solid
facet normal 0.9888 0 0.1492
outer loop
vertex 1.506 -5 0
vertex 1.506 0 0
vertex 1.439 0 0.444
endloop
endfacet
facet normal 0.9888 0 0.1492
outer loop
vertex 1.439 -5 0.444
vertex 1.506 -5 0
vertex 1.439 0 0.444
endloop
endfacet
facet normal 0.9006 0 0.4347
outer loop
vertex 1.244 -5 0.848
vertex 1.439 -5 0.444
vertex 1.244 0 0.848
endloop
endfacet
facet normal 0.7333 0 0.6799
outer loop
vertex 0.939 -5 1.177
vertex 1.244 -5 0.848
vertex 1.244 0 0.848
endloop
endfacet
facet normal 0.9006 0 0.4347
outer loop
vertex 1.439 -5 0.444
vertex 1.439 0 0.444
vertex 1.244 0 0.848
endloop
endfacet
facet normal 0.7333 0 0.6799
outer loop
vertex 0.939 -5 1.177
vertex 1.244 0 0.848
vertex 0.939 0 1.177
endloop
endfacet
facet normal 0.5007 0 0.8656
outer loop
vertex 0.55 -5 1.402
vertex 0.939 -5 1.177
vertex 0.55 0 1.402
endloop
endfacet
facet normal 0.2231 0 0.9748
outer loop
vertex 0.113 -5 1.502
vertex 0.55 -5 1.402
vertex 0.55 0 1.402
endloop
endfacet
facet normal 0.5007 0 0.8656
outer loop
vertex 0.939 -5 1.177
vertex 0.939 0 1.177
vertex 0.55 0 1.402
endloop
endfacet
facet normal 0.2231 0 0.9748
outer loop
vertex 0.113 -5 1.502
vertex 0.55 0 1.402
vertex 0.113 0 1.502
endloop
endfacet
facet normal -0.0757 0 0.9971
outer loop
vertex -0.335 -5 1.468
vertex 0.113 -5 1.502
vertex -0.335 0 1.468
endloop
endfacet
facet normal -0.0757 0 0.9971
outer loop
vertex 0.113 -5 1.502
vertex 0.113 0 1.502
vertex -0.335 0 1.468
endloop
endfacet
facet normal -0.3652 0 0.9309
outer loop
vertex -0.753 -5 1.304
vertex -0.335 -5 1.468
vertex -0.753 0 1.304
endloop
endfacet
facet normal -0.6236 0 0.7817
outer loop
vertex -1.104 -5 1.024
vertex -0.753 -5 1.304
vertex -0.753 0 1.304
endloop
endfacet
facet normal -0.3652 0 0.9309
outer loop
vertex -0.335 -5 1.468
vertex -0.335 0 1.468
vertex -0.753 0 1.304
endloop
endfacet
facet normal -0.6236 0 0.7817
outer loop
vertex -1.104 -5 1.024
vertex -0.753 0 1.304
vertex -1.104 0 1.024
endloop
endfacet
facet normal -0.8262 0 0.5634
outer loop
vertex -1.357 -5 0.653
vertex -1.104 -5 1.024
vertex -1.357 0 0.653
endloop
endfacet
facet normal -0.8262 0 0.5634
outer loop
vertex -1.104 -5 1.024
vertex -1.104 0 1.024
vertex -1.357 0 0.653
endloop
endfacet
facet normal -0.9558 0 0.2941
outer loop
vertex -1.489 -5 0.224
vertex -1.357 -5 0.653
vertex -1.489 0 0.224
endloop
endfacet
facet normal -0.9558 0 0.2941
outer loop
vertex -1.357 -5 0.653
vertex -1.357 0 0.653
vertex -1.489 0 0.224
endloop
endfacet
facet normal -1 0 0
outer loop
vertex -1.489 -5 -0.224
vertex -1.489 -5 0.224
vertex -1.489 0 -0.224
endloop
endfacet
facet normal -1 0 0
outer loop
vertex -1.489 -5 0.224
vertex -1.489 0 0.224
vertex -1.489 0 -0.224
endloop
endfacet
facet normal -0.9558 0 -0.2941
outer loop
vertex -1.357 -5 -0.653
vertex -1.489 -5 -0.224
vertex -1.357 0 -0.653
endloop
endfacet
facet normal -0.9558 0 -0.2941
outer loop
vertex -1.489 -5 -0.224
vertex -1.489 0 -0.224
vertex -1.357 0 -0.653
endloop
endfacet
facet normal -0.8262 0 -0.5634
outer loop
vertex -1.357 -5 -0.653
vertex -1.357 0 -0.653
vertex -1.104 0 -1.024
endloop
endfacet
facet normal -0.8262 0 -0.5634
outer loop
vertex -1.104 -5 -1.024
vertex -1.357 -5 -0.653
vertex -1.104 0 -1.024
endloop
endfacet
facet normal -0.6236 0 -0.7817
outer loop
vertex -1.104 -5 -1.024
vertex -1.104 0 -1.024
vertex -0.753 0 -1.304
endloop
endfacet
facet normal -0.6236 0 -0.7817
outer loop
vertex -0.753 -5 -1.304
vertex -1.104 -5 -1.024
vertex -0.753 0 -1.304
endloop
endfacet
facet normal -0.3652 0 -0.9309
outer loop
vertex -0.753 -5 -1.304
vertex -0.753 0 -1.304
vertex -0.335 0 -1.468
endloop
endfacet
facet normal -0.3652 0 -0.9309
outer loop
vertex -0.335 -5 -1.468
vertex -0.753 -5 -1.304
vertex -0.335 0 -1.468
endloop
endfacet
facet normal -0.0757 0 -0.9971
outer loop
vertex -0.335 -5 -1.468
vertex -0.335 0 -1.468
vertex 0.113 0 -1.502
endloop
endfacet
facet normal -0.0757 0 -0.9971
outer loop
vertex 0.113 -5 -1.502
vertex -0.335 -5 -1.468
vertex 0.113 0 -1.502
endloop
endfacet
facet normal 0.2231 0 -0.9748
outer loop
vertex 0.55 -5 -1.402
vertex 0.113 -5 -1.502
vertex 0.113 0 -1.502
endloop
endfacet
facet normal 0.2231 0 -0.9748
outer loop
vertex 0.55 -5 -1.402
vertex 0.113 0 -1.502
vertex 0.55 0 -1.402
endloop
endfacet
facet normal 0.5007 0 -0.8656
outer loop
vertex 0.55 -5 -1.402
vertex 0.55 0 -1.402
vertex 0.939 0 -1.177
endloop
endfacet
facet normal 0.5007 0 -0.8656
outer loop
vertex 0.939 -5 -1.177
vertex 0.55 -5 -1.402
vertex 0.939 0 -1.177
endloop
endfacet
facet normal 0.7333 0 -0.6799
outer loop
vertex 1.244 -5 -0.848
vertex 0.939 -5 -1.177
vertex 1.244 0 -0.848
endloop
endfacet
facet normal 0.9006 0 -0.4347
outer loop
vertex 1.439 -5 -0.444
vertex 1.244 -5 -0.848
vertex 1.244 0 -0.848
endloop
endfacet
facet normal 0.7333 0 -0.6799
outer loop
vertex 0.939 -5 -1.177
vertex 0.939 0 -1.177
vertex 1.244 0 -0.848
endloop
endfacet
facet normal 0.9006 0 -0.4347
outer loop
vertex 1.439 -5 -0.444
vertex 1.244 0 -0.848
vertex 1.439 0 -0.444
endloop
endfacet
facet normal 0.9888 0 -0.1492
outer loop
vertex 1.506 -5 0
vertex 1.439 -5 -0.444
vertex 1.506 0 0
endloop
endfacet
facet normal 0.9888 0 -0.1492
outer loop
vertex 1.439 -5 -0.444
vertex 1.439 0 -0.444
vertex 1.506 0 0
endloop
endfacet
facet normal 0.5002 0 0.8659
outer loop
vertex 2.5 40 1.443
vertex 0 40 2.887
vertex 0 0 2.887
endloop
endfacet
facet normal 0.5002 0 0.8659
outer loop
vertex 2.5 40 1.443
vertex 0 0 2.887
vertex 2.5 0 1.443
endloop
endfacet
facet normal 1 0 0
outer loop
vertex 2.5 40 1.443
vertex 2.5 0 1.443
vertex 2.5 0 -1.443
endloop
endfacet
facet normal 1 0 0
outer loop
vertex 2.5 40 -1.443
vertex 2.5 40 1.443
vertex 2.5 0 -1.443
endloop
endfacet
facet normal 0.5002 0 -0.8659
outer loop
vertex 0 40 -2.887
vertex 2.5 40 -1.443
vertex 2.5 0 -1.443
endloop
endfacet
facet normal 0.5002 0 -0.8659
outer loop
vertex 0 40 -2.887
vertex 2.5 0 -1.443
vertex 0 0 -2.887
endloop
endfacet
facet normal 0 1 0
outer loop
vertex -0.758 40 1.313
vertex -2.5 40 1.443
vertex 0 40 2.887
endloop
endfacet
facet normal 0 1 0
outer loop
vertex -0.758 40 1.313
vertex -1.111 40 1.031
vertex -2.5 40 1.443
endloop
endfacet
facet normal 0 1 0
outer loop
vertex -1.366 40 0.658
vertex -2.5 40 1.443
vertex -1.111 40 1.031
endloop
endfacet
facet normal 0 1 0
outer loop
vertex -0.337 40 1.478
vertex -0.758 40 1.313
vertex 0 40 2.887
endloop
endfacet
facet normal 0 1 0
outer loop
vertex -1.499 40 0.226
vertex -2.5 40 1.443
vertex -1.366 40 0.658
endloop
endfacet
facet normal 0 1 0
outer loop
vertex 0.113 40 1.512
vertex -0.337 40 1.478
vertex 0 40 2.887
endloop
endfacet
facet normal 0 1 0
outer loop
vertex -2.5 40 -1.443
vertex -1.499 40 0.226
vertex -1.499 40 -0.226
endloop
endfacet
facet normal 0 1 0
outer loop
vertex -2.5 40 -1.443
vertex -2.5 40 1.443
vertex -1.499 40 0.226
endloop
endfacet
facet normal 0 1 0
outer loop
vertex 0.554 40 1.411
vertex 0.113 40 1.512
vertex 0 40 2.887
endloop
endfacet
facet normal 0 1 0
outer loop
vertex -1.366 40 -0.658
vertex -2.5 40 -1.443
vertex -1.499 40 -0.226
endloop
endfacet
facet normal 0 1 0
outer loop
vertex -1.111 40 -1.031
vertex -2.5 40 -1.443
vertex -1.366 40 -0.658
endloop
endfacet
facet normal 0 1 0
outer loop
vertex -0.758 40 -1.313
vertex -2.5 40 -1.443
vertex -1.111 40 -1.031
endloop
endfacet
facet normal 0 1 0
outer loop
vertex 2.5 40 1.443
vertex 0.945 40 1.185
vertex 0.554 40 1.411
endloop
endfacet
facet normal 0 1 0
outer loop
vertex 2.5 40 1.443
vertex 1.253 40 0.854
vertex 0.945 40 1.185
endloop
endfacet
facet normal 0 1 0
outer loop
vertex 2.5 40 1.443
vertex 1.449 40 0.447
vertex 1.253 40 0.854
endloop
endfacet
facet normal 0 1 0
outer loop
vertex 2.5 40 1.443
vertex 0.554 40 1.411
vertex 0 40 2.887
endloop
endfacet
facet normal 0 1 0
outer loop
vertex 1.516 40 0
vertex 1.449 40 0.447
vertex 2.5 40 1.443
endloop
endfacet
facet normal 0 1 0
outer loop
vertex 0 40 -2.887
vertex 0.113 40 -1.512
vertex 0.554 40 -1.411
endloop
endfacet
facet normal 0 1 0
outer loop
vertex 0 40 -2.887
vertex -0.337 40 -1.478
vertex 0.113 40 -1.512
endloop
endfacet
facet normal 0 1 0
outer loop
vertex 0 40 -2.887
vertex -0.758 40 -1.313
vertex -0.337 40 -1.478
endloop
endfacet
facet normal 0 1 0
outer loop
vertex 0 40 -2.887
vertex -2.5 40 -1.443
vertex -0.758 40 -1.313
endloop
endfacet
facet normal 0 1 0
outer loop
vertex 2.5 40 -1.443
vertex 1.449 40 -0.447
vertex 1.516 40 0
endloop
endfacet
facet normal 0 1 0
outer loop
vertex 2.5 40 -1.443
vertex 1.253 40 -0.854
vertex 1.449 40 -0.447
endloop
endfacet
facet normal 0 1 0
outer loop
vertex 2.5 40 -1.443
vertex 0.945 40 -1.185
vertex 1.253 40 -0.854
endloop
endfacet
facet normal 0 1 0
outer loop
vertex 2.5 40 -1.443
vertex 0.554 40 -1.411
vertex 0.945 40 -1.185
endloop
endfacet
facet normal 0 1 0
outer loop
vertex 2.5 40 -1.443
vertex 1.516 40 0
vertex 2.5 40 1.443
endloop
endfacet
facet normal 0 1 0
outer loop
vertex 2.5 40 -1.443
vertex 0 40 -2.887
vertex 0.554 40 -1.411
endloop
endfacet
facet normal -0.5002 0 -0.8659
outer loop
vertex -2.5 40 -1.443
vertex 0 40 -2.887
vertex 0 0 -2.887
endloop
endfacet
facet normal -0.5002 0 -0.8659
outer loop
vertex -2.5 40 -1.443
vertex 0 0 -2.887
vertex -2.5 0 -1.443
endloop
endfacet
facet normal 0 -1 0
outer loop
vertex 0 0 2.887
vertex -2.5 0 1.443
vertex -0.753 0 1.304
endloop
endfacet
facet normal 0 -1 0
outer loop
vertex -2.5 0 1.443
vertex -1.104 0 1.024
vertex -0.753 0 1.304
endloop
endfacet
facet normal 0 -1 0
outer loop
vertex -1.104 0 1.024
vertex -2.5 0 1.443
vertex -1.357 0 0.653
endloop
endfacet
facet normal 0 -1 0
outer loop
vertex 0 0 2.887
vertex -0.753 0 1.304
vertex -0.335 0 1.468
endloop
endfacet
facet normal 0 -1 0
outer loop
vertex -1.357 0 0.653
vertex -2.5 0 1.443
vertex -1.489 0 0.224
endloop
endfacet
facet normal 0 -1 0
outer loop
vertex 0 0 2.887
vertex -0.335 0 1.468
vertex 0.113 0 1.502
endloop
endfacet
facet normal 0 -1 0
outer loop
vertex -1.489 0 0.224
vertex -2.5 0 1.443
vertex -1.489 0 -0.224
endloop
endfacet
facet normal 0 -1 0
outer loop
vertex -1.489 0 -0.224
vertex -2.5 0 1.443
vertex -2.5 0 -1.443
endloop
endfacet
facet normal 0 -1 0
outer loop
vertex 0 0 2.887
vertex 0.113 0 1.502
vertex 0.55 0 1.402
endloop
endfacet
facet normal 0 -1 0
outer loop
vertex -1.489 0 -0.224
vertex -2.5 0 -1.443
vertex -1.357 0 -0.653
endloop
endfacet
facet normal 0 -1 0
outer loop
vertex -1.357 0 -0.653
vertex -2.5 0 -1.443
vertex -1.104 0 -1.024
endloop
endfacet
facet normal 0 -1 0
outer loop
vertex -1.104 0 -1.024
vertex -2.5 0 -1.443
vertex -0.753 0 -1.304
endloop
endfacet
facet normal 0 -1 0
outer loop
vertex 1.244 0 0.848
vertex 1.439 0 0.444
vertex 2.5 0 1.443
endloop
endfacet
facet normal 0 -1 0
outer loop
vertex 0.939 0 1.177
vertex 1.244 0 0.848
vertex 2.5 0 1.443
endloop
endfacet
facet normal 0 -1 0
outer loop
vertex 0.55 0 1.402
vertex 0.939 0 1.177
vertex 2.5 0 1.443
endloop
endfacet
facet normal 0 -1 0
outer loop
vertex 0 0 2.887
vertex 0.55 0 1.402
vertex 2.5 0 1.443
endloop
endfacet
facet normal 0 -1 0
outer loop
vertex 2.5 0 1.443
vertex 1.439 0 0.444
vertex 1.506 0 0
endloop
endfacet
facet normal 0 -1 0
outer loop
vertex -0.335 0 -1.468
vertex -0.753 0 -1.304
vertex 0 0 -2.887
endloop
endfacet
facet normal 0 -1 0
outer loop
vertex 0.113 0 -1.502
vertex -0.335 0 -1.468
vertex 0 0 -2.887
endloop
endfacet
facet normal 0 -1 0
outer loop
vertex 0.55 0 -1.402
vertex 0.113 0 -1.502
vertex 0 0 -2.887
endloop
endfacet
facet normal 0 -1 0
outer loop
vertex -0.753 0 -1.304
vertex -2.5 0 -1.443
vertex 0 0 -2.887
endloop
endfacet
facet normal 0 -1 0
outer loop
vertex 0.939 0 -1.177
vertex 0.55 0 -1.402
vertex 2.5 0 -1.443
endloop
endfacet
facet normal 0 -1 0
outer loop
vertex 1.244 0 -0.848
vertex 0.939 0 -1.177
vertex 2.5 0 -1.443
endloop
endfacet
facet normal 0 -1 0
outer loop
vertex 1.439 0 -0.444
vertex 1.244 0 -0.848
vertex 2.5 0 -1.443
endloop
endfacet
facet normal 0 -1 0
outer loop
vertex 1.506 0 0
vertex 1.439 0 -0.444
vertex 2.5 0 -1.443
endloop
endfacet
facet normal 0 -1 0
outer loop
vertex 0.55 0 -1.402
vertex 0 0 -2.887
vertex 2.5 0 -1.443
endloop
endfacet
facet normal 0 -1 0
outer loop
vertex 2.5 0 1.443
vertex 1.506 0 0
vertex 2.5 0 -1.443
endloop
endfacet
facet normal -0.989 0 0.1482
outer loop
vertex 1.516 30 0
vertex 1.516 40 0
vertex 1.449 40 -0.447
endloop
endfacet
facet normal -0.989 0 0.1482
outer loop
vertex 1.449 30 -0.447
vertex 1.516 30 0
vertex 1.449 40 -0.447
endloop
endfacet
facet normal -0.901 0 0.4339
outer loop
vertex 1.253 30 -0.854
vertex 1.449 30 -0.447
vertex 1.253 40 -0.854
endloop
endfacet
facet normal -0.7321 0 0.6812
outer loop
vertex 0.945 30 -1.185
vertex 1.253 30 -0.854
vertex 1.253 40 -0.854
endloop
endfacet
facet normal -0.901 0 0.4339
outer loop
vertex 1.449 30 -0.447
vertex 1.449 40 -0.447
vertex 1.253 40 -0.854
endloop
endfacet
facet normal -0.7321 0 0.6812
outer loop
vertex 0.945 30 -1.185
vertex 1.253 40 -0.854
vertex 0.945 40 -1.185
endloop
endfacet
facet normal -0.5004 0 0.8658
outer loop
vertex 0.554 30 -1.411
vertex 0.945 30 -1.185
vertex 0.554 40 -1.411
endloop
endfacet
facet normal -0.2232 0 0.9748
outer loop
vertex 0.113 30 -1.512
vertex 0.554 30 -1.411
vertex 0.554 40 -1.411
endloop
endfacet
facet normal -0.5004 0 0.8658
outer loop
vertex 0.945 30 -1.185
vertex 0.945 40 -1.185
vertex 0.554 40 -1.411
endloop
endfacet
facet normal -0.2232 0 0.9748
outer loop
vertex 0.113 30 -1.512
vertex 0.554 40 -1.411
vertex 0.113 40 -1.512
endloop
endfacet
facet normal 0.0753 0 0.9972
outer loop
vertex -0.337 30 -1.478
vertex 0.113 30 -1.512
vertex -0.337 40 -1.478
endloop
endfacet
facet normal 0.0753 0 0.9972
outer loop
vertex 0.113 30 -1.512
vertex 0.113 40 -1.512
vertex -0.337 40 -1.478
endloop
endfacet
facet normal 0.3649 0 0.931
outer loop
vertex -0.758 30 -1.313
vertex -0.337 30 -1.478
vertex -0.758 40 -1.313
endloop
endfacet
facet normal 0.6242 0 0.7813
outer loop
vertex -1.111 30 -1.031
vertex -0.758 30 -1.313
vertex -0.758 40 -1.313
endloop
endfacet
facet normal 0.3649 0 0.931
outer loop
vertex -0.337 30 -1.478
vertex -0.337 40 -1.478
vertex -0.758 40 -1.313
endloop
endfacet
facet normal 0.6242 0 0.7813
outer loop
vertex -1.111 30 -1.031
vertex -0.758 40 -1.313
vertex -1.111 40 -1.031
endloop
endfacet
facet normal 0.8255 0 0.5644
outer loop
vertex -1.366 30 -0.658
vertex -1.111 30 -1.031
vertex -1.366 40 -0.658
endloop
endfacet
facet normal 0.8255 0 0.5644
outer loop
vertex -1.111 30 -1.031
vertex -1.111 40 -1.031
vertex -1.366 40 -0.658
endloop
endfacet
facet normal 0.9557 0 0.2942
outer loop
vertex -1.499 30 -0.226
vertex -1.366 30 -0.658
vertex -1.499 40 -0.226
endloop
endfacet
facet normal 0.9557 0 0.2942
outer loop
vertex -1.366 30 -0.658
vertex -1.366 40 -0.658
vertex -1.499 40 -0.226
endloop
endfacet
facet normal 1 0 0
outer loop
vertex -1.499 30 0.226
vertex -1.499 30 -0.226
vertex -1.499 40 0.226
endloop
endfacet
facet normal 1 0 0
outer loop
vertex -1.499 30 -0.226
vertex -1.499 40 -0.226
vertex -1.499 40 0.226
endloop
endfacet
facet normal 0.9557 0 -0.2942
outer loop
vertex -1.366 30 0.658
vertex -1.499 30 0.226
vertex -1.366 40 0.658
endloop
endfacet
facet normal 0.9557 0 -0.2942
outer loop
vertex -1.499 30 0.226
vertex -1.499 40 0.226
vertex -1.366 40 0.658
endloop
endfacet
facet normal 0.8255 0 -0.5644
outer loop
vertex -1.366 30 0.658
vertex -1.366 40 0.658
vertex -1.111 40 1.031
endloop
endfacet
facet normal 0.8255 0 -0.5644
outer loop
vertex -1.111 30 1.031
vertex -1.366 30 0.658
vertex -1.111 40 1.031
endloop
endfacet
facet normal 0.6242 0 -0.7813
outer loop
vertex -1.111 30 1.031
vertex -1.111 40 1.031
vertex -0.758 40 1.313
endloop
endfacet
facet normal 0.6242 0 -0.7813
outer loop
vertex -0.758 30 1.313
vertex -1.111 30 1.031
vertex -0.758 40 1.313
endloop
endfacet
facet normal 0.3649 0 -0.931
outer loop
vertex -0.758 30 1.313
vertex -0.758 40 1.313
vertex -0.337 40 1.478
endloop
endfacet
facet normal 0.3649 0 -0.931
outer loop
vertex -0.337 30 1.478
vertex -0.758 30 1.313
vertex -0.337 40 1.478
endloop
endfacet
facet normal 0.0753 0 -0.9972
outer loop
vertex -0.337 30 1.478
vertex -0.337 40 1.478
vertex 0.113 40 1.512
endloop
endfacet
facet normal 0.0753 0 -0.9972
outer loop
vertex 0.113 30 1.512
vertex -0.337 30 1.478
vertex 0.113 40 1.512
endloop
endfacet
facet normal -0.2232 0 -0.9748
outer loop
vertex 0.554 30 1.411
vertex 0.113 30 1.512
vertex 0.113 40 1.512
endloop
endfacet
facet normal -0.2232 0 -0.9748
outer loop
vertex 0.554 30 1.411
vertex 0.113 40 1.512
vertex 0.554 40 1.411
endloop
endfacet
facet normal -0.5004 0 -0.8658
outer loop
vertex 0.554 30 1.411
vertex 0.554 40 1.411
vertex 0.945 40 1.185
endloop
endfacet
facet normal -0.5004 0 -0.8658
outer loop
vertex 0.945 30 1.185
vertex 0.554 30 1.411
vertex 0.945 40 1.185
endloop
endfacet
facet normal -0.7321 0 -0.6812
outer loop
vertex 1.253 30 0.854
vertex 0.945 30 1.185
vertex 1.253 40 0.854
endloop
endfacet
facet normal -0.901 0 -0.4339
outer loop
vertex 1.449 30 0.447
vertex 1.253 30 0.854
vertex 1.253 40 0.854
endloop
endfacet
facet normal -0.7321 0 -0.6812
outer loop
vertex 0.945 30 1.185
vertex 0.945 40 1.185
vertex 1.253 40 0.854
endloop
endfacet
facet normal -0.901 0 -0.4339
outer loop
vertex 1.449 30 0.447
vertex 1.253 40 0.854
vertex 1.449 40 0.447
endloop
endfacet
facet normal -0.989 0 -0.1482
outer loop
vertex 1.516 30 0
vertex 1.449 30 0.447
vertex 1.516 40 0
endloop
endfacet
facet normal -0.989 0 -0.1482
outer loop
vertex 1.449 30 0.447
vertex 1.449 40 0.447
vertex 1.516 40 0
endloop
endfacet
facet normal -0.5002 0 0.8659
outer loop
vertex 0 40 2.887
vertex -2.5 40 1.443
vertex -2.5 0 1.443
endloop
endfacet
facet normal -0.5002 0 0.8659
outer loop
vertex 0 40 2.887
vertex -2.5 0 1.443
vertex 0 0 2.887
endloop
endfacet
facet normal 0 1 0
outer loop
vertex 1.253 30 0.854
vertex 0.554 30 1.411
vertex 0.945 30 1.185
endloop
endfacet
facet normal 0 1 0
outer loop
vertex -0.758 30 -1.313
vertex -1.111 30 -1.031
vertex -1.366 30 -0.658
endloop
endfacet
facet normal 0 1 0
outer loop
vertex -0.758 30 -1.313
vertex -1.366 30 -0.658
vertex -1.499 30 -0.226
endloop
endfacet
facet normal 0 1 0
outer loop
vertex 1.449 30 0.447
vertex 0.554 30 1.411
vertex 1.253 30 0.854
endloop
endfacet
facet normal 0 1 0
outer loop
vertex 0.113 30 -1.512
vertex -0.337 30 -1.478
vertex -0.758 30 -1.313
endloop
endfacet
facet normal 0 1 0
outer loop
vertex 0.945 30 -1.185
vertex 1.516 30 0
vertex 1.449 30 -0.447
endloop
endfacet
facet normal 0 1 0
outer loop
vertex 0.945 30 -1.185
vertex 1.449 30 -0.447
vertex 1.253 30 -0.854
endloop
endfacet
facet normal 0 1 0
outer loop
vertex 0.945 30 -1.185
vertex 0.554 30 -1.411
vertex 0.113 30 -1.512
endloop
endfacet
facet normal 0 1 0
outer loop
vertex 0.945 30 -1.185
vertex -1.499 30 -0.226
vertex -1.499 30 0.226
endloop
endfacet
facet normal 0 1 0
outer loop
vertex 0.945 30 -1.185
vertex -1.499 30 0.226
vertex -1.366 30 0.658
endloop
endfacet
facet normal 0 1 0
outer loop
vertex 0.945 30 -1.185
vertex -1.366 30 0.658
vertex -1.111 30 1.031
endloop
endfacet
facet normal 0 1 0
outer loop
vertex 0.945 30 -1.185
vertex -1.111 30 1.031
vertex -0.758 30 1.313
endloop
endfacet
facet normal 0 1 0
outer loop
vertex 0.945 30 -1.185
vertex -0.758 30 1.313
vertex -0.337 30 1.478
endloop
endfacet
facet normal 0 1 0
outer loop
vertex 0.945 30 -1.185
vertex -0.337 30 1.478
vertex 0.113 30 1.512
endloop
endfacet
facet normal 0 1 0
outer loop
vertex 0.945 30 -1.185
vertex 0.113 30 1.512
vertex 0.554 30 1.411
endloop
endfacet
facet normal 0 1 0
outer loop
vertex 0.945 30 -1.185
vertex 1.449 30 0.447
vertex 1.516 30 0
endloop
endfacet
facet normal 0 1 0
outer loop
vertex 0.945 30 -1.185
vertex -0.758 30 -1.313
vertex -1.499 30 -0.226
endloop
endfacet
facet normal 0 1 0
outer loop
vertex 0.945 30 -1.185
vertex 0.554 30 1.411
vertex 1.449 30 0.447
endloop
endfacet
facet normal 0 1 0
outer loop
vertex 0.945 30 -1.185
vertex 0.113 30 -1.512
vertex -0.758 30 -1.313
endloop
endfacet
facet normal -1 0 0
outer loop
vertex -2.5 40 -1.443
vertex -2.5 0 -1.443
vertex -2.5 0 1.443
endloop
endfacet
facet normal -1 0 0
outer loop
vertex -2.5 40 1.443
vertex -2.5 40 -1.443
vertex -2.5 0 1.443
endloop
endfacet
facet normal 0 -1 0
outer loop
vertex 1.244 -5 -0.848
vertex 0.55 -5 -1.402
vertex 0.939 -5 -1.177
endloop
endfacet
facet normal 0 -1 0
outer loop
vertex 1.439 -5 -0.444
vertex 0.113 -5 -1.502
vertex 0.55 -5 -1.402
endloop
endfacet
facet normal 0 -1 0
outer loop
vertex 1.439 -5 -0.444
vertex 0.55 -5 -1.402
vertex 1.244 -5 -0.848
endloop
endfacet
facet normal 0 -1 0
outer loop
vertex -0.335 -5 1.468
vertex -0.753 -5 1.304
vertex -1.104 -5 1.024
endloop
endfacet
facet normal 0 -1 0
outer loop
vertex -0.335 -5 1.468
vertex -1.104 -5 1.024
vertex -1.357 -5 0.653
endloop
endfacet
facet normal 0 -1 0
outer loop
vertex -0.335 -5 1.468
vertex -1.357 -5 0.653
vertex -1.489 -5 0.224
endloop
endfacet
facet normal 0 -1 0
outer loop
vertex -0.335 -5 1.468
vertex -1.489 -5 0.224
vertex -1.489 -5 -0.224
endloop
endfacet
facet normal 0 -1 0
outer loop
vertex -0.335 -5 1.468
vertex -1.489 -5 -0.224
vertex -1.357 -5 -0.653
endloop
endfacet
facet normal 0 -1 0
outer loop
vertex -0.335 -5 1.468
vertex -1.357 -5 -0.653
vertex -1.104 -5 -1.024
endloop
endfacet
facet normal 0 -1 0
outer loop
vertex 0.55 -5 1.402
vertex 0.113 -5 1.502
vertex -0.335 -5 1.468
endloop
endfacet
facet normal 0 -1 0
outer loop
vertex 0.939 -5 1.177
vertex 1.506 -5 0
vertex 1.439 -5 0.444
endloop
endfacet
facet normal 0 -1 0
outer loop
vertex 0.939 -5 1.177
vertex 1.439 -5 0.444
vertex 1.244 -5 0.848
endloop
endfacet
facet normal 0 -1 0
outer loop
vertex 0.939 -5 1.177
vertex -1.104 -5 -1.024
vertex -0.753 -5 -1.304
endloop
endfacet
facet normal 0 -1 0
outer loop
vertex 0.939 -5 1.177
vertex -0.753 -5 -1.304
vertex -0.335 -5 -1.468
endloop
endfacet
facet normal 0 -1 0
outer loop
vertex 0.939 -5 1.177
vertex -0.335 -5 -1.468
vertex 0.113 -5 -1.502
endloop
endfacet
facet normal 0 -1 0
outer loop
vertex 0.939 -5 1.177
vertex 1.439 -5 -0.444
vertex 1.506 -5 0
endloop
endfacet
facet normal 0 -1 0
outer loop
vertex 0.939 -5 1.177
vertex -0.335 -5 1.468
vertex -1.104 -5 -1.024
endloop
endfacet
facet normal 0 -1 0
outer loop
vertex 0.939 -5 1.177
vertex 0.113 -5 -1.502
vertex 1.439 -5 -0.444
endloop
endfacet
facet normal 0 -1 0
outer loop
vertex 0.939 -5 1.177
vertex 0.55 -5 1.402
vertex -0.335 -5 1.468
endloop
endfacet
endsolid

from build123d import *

# Parameters (mm, degrees)
BOSS_EXTRUDE1_DEPTH = 40
SKETCH2_R           = 1.516102493
CUT_EXTRUDE1_DEPTH  = 10
SKETCH3_R           = 1.505855903
BOSS_EXTRUDE2_DEPTH = 5


with BuildPart() as part:
    # Sketch1 → Boss-Extrude1 (new body)
    with BuildSketch(Plane(origin=(0, 0, 0), x_dir=(1, 0, 0), z_dir=(0, 1, 0))):
        Polygon((0, -2.886751346), (2.5, -1.443375673), (2.5, 1.443375673), (0, 2.886751346), (-2.5, 1.443375673), (-2.5, -1.443375673), align=None)
    extrude(amount=BOSS_EXTRUDE1_DEPTH)

    # Sketch2 → Cut-Extrude1 (cut)
    with BuildSketch(Plane(origin=(0, 40, 0), x_dir=(1, 0, 0), z_dir=(0, 1, 0))):
        Circle(SKETCH2_R)
    extrude(amount=-CUT_EXTRUDE1_DEPTH, mode=Mode.SUBTRACT)

    # Sketch3 → Boss-Extrude2 (add)
    with BuildSketch(Plane.XZ):
        Circle(SKETCH3_R)
    extrude(amount=BOSS_EXTRUDE2_DEPTH)


solid = part.part
